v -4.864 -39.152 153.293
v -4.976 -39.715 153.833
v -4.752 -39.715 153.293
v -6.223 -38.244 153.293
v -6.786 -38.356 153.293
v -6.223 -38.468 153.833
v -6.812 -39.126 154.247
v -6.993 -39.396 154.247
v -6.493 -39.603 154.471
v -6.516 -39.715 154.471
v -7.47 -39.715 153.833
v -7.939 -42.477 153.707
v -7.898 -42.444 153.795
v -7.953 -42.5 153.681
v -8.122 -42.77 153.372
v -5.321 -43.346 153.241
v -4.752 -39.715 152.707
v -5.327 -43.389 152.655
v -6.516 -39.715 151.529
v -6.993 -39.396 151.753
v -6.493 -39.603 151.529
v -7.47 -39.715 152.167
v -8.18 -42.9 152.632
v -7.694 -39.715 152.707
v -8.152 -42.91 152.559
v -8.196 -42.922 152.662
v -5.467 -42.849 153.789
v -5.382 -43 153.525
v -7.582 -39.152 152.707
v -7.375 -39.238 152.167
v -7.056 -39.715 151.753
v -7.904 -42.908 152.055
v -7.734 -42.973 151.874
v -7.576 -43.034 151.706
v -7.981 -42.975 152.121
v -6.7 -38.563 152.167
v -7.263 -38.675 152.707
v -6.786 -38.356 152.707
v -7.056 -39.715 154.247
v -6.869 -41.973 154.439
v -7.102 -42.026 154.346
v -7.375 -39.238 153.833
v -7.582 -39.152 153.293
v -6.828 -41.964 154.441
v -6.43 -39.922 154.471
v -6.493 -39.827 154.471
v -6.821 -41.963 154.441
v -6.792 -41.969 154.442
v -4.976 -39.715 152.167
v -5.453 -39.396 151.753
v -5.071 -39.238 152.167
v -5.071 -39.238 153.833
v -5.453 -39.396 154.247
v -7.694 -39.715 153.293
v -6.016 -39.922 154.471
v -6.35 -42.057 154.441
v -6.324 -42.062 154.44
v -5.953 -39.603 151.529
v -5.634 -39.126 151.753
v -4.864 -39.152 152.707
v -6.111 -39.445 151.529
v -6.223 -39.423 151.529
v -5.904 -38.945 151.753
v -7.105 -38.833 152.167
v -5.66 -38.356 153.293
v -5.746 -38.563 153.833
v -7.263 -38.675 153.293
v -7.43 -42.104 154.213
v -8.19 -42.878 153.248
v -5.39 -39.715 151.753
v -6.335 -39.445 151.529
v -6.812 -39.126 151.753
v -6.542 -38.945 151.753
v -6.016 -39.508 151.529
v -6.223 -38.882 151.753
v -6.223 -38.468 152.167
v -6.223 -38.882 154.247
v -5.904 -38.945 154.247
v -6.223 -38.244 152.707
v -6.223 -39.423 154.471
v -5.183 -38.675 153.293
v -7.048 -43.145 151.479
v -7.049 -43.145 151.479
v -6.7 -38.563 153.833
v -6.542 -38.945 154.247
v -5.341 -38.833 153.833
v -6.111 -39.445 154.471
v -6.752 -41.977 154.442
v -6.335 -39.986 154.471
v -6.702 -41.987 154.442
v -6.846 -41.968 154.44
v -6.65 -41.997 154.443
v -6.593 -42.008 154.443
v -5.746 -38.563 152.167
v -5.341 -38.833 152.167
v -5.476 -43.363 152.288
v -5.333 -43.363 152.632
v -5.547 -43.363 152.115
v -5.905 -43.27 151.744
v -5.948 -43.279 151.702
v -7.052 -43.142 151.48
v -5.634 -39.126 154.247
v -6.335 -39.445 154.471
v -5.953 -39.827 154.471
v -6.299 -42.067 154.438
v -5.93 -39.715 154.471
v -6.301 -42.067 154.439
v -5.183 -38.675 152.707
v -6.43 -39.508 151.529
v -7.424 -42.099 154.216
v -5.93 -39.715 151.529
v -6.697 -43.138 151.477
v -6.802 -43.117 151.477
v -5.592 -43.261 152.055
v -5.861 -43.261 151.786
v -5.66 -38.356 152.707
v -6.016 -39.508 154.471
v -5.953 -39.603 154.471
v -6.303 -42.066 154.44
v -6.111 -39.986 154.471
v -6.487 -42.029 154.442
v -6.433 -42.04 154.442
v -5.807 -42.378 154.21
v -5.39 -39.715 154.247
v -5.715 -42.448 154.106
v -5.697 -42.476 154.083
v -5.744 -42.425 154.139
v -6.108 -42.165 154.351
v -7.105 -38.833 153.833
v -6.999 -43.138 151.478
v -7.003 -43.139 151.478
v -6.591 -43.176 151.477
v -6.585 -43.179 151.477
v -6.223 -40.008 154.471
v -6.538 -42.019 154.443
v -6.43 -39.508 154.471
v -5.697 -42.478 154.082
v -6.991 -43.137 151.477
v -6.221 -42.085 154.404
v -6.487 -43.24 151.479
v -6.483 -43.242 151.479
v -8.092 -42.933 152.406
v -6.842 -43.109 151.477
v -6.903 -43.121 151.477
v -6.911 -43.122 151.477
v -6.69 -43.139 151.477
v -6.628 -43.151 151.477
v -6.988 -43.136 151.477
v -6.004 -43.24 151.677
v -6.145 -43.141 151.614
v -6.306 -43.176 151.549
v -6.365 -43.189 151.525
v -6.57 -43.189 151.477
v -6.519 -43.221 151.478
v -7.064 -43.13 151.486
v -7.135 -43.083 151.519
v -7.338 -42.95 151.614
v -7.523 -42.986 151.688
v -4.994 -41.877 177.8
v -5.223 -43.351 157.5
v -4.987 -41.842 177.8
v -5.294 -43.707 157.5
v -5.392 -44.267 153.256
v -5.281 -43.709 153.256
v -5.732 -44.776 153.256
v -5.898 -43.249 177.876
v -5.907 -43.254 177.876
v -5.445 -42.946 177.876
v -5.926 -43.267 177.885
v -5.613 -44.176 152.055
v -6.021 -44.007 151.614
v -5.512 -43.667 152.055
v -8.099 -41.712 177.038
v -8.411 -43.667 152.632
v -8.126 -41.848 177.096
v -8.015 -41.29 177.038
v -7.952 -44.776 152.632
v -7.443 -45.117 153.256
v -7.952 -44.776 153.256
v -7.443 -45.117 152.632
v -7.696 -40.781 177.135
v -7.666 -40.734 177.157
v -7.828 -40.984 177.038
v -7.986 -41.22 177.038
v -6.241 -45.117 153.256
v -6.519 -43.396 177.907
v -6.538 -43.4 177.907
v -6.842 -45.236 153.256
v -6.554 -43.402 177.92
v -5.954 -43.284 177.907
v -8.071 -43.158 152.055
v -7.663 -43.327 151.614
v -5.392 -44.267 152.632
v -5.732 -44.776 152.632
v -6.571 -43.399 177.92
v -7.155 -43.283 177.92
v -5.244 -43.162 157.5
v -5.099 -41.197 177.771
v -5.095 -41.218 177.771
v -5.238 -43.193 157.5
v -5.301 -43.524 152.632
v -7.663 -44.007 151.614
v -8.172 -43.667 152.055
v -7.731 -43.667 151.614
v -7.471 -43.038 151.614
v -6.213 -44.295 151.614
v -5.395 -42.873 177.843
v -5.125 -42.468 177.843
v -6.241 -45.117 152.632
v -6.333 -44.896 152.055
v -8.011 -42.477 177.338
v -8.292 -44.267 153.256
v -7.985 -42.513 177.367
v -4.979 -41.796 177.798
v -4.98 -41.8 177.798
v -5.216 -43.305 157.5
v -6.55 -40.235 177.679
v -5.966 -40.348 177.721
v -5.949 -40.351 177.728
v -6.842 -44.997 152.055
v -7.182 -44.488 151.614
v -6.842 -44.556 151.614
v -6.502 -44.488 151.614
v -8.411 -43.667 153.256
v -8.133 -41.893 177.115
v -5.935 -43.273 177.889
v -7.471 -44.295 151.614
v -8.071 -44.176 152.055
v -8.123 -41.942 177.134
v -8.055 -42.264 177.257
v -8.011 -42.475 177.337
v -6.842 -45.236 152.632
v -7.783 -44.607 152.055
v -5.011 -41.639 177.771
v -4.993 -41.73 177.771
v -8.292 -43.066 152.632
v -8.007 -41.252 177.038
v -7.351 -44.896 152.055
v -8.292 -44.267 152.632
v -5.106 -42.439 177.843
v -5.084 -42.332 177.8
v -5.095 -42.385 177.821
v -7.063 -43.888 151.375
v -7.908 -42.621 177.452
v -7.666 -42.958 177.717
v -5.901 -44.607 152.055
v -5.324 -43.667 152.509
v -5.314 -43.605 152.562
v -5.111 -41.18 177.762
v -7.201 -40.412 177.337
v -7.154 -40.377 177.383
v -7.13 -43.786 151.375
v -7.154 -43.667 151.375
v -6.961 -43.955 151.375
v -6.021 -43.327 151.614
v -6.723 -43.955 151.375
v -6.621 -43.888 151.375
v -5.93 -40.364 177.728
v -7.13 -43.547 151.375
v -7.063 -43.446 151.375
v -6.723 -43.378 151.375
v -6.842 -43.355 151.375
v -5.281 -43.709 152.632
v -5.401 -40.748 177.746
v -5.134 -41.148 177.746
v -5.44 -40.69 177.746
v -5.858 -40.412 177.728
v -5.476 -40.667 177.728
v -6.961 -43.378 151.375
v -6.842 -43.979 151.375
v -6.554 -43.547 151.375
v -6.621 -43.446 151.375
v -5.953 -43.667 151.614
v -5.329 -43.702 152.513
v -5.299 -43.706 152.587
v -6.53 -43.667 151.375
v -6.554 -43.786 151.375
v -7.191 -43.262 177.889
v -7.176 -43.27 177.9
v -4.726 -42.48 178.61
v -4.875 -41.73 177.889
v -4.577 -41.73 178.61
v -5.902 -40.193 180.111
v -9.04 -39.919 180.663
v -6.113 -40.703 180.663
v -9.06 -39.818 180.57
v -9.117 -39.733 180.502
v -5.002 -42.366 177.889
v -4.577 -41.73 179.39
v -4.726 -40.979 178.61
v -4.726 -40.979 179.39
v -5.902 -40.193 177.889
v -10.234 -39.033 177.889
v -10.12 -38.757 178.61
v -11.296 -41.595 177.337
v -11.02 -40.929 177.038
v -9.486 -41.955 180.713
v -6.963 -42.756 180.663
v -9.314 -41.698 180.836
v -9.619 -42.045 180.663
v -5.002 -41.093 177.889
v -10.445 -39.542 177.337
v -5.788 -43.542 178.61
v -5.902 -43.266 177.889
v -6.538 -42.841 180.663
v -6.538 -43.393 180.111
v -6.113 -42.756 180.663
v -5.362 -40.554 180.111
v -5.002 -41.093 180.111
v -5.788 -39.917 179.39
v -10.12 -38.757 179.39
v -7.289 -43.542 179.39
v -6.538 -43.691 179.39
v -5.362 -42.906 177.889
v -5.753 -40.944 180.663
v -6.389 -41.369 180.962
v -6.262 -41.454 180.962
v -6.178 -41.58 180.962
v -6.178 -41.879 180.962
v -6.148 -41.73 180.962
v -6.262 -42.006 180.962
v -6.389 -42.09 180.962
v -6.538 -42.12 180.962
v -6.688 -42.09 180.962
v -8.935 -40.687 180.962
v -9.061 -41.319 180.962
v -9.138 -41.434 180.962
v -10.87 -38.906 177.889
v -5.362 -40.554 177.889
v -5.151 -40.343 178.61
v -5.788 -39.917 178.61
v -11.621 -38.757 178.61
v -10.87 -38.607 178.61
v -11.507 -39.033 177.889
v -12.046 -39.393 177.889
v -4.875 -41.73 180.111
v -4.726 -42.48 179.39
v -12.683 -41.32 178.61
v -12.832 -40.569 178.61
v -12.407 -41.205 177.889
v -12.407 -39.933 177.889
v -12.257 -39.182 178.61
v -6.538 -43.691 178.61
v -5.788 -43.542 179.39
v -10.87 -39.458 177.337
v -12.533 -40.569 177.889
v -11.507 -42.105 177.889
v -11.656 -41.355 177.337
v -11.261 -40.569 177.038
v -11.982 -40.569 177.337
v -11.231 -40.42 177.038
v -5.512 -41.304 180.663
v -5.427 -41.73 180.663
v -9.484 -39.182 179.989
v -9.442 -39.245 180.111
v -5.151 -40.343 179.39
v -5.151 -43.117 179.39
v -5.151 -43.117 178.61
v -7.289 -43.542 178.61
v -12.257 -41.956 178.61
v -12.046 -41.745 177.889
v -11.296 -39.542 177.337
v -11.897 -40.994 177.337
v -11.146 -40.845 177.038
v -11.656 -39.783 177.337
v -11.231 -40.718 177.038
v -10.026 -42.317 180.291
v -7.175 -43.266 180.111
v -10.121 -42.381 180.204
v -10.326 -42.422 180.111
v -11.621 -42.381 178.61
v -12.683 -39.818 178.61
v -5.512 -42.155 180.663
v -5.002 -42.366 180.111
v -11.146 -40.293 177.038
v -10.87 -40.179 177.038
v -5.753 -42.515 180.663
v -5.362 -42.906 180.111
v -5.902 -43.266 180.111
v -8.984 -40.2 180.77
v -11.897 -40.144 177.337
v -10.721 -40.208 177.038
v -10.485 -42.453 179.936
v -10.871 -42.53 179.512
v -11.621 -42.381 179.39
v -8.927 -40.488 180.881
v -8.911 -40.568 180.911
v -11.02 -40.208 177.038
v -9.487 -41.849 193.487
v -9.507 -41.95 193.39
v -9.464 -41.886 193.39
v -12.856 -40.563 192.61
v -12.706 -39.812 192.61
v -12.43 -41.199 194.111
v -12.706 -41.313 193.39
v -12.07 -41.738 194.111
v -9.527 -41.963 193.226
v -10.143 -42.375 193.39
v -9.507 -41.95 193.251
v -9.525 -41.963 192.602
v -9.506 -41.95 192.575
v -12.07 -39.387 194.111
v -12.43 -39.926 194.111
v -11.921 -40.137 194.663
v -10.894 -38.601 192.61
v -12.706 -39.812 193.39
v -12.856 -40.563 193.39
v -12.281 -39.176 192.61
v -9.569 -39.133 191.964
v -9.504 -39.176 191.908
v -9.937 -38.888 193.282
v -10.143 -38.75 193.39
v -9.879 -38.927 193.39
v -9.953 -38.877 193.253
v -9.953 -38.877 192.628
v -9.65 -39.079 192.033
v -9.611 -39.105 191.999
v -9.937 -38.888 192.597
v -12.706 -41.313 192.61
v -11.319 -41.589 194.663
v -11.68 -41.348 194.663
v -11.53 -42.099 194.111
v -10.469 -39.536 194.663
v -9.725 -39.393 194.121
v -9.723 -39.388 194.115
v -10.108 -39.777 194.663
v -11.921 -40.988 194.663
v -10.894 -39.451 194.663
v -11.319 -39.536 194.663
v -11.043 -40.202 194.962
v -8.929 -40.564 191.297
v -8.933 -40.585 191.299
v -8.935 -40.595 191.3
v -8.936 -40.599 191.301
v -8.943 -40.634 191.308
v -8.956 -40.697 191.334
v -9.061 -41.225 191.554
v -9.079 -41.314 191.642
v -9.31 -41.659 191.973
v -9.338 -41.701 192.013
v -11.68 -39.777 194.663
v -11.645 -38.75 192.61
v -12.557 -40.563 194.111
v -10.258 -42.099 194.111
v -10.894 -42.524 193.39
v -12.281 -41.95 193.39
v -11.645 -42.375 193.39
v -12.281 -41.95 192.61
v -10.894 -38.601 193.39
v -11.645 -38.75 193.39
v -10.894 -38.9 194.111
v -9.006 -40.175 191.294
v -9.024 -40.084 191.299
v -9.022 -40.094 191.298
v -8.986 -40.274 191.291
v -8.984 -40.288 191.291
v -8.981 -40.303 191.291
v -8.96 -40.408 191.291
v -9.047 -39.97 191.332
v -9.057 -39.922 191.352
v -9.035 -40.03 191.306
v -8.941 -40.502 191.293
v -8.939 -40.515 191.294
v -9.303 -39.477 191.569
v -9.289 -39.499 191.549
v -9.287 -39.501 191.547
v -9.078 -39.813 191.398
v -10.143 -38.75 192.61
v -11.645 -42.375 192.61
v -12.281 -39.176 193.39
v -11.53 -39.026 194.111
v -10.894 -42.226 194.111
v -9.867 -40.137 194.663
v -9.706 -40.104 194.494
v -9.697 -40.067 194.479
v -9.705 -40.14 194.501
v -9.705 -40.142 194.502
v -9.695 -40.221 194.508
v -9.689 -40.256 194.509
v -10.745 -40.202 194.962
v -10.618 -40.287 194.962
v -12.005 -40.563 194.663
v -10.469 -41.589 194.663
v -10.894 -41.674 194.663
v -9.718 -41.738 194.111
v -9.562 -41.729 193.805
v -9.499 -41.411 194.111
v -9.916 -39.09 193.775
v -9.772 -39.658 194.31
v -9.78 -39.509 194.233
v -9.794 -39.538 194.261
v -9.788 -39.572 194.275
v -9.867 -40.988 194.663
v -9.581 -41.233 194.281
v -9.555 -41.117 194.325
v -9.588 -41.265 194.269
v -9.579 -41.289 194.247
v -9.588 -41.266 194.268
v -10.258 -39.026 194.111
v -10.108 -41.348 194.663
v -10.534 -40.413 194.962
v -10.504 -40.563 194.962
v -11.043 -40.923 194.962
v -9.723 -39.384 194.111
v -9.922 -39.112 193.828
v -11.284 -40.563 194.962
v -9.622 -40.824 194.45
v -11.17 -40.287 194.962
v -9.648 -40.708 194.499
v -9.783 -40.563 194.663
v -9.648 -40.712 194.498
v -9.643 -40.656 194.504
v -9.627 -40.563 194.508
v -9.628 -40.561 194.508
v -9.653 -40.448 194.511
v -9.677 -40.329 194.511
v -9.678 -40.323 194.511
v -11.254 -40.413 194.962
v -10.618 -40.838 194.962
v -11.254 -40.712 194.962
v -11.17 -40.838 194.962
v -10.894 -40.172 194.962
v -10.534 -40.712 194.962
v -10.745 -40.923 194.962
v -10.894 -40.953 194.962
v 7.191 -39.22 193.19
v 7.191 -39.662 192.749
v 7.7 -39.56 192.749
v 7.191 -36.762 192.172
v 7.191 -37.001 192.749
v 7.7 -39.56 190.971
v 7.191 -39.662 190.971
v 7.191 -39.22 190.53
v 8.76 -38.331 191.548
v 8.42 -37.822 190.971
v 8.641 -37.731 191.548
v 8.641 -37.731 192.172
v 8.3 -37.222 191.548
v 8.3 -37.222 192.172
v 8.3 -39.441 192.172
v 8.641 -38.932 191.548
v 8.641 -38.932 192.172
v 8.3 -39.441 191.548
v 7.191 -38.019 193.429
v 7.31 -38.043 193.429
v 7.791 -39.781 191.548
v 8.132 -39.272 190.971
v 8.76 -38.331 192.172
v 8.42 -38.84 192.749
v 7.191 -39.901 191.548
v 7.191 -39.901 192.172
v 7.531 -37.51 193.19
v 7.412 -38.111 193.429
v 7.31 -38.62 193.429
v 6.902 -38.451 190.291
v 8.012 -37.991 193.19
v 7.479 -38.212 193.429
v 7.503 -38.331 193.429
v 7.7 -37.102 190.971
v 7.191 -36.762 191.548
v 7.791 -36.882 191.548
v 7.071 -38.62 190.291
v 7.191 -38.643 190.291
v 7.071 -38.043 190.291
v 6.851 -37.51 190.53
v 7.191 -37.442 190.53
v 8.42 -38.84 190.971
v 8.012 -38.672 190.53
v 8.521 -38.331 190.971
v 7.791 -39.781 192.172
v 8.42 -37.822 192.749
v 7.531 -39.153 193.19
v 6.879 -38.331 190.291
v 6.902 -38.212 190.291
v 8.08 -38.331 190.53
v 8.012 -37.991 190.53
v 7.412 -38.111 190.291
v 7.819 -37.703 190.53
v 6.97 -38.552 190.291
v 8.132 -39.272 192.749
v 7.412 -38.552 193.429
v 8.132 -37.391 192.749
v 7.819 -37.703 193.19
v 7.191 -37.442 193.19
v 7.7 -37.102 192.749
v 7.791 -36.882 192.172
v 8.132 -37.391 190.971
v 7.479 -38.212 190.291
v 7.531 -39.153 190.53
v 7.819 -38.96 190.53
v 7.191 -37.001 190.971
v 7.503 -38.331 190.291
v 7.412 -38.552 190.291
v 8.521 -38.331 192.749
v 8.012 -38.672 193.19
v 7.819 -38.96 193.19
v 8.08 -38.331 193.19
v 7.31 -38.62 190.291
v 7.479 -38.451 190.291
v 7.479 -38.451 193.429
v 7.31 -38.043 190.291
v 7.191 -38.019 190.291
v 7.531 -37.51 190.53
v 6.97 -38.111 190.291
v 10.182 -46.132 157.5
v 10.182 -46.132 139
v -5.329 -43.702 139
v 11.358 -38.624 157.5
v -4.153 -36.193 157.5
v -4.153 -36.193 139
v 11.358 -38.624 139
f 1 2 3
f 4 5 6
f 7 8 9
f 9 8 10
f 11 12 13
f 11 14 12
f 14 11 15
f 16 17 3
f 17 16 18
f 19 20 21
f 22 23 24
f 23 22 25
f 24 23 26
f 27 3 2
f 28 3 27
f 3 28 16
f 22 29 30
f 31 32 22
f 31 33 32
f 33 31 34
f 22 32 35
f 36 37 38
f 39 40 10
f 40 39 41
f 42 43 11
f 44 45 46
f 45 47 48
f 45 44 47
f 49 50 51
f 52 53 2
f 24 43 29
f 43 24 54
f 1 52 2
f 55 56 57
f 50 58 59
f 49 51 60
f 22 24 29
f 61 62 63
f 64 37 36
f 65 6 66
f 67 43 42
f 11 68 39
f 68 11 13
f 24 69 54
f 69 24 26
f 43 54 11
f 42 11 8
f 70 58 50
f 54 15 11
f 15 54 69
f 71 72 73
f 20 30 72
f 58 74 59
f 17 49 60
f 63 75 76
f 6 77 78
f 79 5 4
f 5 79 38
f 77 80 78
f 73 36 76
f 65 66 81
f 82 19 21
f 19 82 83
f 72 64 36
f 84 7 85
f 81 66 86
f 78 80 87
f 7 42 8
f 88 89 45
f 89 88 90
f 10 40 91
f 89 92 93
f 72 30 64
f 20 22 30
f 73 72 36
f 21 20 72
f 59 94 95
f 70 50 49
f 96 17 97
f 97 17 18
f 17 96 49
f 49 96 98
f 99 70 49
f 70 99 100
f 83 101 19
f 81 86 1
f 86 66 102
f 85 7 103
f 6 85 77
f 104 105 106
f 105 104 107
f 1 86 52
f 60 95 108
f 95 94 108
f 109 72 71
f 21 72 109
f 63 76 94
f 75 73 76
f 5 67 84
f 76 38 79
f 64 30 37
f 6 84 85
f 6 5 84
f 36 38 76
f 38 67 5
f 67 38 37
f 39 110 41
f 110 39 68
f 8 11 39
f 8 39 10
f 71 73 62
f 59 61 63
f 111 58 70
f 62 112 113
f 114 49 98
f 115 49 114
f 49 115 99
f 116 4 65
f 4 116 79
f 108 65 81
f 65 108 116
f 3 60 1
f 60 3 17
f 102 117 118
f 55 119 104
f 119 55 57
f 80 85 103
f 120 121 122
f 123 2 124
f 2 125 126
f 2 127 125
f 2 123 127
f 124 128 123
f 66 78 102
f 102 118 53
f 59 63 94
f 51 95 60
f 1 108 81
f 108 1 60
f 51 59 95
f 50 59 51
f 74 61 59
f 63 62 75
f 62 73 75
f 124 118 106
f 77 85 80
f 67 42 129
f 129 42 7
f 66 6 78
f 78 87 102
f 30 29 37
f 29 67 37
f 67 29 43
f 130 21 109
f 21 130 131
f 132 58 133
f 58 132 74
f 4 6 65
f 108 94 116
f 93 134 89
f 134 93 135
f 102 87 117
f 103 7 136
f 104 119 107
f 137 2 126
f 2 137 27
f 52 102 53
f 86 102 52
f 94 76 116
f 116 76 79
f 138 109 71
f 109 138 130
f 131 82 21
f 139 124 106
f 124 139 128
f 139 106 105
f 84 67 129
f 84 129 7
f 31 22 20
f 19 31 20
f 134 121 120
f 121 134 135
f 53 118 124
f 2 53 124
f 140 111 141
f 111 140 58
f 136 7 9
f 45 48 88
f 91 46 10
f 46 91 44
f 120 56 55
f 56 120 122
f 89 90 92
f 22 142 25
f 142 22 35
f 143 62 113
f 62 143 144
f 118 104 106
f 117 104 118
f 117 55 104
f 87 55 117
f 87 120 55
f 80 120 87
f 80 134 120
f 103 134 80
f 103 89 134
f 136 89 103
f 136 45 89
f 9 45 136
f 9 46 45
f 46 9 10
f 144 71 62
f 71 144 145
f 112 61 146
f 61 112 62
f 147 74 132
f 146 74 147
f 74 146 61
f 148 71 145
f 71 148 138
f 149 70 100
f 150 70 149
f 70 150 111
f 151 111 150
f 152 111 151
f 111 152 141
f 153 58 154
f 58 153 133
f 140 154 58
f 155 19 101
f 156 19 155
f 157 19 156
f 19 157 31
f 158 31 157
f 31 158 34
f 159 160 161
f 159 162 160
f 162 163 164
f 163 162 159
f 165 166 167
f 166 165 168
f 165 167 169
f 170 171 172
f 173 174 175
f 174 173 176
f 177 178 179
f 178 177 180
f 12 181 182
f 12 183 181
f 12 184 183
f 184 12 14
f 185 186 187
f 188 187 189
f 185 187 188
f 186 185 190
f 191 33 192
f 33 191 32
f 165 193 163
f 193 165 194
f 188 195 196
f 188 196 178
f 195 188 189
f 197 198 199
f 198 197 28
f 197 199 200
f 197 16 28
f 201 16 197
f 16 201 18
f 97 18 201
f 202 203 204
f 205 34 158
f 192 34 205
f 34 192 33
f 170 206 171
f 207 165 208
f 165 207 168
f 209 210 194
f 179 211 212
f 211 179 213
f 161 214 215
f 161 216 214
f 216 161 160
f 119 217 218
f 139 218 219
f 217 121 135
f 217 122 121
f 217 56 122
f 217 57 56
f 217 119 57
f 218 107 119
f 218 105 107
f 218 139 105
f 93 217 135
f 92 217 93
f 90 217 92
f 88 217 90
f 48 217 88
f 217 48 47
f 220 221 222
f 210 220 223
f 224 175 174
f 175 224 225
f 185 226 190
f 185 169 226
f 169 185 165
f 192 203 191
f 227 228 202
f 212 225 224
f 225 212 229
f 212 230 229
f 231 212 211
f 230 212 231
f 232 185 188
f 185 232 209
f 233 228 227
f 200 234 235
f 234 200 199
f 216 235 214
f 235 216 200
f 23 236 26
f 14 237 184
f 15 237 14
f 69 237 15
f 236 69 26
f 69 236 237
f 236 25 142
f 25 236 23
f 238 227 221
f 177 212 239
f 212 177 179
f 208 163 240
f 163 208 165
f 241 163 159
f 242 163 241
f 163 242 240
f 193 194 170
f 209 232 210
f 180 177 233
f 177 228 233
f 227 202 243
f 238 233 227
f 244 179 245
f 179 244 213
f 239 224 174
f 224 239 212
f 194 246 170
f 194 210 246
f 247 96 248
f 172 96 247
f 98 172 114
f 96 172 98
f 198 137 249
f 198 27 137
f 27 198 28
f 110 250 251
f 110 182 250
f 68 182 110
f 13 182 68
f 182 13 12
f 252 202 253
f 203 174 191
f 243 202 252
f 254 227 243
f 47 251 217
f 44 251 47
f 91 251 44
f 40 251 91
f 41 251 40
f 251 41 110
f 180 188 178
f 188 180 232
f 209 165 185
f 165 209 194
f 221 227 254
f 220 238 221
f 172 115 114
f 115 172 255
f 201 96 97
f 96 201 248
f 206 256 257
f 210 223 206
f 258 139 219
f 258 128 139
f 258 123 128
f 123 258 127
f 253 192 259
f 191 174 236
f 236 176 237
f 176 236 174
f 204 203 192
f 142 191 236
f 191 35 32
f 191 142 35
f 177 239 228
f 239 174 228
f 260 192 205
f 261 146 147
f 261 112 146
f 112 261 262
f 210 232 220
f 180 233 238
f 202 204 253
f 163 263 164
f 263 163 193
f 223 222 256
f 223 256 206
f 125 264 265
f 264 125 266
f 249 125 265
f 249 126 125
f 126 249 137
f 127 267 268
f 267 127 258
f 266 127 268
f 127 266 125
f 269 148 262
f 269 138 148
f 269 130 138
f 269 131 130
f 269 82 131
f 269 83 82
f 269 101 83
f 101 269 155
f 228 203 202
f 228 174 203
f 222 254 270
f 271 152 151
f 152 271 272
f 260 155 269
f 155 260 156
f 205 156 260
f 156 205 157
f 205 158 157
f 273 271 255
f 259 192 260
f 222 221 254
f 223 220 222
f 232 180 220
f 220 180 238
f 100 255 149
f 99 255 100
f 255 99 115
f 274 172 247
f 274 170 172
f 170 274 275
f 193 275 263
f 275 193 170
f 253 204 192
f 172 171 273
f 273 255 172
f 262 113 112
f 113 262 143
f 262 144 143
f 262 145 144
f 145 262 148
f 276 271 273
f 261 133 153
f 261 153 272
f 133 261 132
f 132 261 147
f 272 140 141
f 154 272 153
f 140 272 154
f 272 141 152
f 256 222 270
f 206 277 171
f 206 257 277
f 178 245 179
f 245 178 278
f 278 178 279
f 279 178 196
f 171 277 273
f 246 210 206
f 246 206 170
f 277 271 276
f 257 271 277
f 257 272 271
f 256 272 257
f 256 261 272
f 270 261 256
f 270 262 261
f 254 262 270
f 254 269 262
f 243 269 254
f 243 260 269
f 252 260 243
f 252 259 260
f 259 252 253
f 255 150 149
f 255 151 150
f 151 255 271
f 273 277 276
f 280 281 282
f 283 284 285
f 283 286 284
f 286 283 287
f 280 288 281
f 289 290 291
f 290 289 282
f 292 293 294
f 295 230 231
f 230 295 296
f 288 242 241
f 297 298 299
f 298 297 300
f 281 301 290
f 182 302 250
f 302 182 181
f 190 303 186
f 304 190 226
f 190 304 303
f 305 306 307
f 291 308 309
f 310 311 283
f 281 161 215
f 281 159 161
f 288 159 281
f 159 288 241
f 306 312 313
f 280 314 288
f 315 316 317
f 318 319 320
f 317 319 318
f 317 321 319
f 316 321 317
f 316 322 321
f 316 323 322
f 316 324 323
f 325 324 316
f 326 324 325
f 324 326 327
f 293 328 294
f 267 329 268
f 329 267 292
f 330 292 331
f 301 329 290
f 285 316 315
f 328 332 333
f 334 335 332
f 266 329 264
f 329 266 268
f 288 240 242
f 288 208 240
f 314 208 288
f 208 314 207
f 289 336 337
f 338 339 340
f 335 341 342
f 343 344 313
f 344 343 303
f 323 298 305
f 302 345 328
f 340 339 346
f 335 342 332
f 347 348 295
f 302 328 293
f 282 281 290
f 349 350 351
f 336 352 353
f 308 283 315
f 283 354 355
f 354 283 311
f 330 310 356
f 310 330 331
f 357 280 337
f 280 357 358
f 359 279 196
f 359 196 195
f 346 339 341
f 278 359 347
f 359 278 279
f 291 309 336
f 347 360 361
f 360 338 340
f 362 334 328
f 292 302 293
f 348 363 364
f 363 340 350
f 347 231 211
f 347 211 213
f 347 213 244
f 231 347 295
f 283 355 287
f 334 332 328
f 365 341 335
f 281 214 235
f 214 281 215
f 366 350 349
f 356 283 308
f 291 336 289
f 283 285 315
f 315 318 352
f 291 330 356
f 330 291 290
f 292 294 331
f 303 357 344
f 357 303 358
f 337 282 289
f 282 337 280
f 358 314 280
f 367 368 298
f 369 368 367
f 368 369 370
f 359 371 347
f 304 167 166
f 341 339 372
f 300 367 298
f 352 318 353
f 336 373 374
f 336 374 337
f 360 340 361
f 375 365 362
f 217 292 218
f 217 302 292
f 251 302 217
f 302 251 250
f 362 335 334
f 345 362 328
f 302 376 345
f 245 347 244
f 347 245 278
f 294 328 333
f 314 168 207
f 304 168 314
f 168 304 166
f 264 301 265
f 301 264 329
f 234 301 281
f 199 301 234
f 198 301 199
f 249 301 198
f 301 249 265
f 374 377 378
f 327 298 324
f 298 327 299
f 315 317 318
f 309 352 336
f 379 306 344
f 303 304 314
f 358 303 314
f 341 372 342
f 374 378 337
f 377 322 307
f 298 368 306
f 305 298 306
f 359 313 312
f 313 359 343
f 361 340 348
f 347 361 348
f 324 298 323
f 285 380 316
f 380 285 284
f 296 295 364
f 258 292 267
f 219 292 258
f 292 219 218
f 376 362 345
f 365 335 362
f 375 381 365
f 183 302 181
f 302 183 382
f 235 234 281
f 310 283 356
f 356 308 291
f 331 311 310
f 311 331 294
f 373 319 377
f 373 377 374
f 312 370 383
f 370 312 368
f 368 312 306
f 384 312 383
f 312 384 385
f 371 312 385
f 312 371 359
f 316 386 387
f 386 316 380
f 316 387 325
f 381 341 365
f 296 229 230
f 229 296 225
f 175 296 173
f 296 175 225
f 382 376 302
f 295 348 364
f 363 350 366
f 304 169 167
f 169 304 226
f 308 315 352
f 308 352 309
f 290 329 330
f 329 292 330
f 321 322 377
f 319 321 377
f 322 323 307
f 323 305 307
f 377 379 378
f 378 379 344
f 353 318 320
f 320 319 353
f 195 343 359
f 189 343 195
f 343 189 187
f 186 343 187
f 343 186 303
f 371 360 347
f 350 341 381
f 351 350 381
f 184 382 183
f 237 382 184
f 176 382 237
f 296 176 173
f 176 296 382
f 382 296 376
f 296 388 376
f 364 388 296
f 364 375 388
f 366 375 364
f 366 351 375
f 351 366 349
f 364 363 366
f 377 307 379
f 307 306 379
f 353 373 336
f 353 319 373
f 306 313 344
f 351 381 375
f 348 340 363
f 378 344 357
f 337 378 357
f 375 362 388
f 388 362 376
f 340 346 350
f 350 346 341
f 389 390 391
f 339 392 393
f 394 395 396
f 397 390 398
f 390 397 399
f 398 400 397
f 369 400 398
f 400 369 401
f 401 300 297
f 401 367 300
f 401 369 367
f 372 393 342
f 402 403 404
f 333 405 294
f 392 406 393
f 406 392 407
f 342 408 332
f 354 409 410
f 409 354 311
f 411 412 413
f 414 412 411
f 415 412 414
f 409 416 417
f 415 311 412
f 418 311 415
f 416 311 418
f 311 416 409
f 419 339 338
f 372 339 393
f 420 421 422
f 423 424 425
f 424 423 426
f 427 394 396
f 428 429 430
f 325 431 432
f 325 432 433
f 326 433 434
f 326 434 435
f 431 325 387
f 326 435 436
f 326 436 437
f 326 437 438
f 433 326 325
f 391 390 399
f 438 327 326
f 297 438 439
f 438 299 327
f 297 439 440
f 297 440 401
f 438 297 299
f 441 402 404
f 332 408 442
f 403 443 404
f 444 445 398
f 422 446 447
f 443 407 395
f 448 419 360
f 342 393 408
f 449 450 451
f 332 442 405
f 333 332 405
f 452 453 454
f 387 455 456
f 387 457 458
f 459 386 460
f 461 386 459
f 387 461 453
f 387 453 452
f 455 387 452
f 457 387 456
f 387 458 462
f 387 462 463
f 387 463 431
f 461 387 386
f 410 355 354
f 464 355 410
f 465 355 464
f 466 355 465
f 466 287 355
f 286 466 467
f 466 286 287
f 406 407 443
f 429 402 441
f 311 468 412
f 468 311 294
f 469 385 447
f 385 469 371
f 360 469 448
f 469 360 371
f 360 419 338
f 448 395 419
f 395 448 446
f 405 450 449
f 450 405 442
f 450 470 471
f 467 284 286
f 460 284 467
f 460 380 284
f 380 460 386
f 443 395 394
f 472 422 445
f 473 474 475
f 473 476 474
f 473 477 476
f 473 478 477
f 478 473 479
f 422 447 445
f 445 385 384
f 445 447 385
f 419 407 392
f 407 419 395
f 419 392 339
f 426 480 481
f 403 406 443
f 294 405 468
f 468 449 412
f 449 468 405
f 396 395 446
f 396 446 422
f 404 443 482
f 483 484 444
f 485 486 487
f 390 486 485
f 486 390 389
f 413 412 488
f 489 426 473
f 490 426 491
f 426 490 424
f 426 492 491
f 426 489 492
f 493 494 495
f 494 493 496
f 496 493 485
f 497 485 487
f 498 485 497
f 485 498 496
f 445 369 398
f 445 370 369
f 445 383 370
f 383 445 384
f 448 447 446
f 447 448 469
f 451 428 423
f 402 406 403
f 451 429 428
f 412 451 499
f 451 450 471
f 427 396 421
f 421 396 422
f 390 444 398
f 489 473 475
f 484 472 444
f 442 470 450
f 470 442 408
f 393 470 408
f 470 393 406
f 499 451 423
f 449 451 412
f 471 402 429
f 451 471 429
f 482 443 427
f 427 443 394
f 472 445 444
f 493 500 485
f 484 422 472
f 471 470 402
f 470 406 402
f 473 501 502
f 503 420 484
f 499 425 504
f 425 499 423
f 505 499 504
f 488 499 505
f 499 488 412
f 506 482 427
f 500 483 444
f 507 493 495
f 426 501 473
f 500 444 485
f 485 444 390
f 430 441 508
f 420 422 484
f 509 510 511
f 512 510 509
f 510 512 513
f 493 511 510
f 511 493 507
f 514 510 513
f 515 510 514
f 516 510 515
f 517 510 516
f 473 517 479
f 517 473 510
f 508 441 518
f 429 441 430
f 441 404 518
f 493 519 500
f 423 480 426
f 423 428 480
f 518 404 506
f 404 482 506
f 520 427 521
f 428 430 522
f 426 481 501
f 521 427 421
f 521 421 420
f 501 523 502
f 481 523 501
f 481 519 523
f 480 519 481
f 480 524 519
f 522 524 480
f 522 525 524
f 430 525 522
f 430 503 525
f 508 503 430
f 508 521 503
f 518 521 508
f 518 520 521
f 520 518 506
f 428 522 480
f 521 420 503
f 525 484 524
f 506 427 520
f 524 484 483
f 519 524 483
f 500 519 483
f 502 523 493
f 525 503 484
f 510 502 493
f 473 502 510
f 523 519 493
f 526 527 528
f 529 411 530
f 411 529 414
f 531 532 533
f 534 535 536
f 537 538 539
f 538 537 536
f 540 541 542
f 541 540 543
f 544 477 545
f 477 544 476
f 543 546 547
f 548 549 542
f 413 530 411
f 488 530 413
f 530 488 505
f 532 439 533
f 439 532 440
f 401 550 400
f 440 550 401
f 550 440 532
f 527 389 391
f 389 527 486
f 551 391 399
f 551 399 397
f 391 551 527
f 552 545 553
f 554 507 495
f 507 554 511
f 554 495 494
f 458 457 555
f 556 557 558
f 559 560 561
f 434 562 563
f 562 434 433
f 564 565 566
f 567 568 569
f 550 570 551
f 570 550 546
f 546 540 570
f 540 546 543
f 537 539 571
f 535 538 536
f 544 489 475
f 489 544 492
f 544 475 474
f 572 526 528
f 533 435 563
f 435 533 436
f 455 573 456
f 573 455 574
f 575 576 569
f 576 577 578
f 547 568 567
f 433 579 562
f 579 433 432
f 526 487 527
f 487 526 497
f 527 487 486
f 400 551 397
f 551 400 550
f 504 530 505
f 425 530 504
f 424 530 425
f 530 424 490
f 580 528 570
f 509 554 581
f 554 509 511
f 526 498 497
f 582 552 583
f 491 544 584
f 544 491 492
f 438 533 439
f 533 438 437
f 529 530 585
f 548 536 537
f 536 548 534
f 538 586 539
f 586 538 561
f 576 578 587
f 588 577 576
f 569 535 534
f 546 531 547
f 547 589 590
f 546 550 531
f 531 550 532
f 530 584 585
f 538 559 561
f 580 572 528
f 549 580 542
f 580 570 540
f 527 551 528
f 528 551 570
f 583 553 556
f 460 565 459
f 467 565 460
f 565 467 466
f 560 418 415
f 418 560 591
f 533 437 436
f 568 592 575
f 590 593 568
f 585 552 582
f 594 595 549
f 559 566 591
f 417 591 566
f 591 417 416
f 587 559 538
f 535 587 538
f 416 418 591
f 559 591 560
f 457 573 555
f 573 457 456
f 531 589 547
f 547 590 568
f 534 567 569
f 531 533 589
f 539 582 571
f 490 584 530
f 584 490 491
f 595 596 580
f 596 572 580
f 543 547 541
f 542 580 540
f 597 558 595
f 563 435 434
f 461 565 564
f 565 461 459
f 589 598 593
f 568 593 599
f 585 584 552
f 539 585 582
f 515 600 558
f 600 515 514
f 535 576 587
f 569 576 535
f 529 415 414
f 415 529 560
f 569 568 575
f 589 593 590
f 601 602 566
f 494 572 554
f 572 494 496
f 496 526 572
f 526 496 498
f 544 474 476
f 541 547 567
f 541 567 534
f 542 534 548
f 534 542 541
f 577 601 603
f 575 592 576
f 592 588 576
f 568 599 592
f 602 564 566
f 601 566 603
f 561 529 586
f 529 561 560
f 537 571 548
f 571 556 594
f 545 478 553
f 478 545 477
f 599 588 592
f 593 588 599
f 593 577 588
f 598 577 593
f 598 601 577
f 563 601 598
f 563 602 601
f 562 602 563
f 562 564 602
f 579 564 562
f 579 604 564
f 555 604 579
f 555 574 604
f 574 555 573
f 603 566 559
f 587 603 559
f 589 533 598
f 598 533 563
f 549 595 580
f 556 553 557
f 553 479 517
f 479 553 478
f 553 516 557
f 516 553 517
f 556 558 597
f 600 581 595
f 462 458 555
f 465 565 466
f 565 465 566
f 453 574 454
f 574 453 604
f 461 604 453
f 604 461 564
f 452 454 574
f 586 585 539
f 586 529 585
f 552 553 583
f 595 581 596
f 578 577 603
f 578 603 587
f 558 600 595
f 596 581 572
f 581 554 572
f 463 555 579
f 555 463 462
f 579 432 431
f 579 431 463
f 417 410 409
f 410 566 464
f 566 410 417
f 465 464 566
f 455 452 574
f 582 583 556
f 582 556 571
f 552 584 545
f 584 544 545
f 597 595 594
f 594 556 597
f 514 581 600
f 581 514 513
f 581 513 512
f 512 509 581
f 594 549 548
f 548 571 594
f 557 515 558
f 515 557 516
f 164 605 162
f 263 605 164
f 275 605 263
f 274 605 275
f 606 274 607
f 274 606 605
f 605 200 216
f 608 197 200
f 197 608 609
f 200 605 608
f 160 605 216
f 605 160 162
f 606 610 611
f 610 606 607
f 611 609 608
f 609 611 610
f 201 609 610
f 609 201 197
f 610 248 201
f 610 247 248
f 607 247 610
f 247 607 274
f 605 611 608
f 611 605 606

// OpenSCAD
// file: nozzle_servo_linkage_64_params.scad
// GENERATED by tools/nozzle_servo_linkage_64.py — do not hand-edit.
// 64 mm nozzle servo linkage, STARBOARD nacelle-local frame (port = mirror x).
NSL_B_R = 39.0; NSL_B_Z = 191.860;
NSL_PSI_CLOSED = 292.5; NSL_PSI_OPEN = 268.75;
NSL_C = [-10.8704, -40.5689, 179.0000];  NSL_C_AZ = 255.0; NSL_C_R = 42.0;
NSL_U = [-0.965926, 0.258819, 0.000000];  NSL_V = [-0.000000, 0.000000, -1.000000];
NSL_L_OUT = 14.0; NSL_L_IN = 4.485; NSL_L_ROD = 18.686; NSL_LINK = 26.073865334942944;
NSL_PHI_CLOSED = 231.000; NSL_PHI_OPEN = 309.200;
NSL_ARM_OFFSET = -90.100;   // input arm angle - output arm angle
NSL_SHAFT = [-6.2229, -39.7154, 153.0000];  NSL_SHAFT_AZ = -98.905;
NSL_HORN = 4.0; NSL_SERVO_SWEEP = 90.10; NSL_TH_CLOSED = -45.85; NSL_TH_OPEN = 44.25;
NSL_SERVO = [18.5, 7.6, 15.7];   // BMS-101DMG L x W x H [REF-ACT-004] VERIFY
// main file
// =============================================================================
// nacelle_nozzle_servo_64mm.scad — 64 mm nozzle servo drive in the dorsal spine
// =============================================================================
// WBS NAC-64-SERVO-01.  Owner decisions 2026-10-04: servo inside the canonical
// dorsal spine; the spine blended aft over the nozzle housing (QMx side view,
// REF-CAD-003); a bellcrank so the drive stays inside canon; the spine
// extension FIXED on the pod so the nozzle is a field-swap module (forward-open
// notch, 2 captive screws, no linkage part handled).
//
// All kinematics come from nozzle_servo_linkage_64_params.scad, GENERATED by
// tools/nozzle_servo_linkage_64.py (never hand-edit): servo BMS-101DMG
// [REF-ACT-004] flat in the spine, shaft tangential, 4 mm horn, +/-45 deg ->
// link -> bellcrank on a radial Ø2 pin (input 4.5 / output 14 mm) -> 18.7 mm
// rod -> the ring's open ball cup at r 39.  Starboard frame; port = mirror x.
//
// Used by nacelle_pod_64mm_tandem.scad:
//   nsv_pod_cuts()  — Zone B: servo pocket, horn/link/bellcrank/rod sweeps,
//                     cover opening + ledge, pin bore, cover-screw inserts
//   nsv_pod_adds()  — Zone C: spine extension over the housing (with the two
//                     captive nozzle-screw counterbores)
// Own parts (NSV_PART): "cover" (print), "bellcrank" (print), "asm" (preview).
//
// COTS: M2 threaded rod + 2 x M2 ball links (rod and link), Ø2 x 12 steel
// dowel (pivot), 3 x M2 captive screws + inserts (cover), 2 x M3 captive
// screws (nozzle).  FORCE MARGIN IS THIN: ear holding 2.6 N vs spring 2.0 N
// (tool output) — if the U8 flap load exceeds ~0.6 N, fit a higher-torque
// servo in the same pocket (WBS NAC-64-SERVO-01).
//
// Author: Claude (Claude Opus 5.5, Anthropic) under the direction of
// Stab-Rabbit-coding, per AGENTS.md AI attribution.  License: CC BY 4.0.
// =============================================================================

include <nozzle_servo_linkage_64_params.scad>

NSV_PART  = "asm";
NSV_SIDE  = 1;              // +1 stbd, -1 port (mirror)
NSV_SHELL = "../../stls/nacelles/eng_right_shell24_50mm_repaired.stl";
NSV_CLR   = 0.6;            // [mm] pocket running clearance
NSV_COVER_T = 1.6;          // [mm] cover skin thickness (>= 1.5)
NSV_SPINE_Z = [138.0, 187.0];   // cover / opening axial span
NSV_SPINE_AZ = [250.0, 292.0];  // cover / opening azimuth span (stbd)
NSV_FLOOR_R = 36.4;         // bore wall (34.7) + 1.7

function nsv_er(az) = [cos(az), sin(az), 0];
function nsv_et(az) = [-sin(az), cos(az), 0];
function nsv_arm(phi, L) = NSL_C + L * (cos(phi) * NSL_U + sin(phi) * NSL_V);
function nsv_ball(psi) = [NSL_B_R * cos(psi), NSL_B_R * sin(psi), NSL_B_Z];
function nsv_horn(th) = NSL_SHAFT + NSL_HORN * (cos(th) * nsv_er(NSL_SHAFT_AZ) + sin(th) * [0, 0, 1]);
// Bellcrank angle phi interpolated linearly in psi (the solved map is near-
// linear over this 24 deg stroke; the tool owns the exact one).
function nsv_phi(f) = NSL_PHI_CLOSED + f * (NSL_PHI_OPEN - NSL_PHI_CLOSED);
function nsv_th(f)  = NSL_TH_CLOSED  + f * (NSL_TH_OPEN  - NSL_TH_CLOSED);
function nsv_psi(f) = NSL_PSI_CLOSED + f * (NSL_PSI_OPEN - NSL_PSI_CLOSED);

module nsv_seg(p, q, d) { hull() { translate(p) sphere(d = d, $fn = 16); translate(q) sphere(d = d, $fn = 16); } }

// Servo body: L along z, W radial (centred on the shaft radius), H tangential
// on the +az side of the horn plane.  Shaft 4.5 mm from the body's aft end.
module nsv_servo_body(clr = 0) {
    s = NSL_SERVO;
    rotate([0, 0, NSL_SHAFT_AZ])
        translate([norm([NSL_SHAFT[0], NSL_SHAFT[1]]) - s[1] / 2 - clr, 1.5 - clr,
                   NSL_SHAFT[2] - (s[0] - 4.5) - clr])
            cube([s[1] + 2 * clr, s[2] + 2 * clr, s[0] + 2 * clr]);
}

// Everything that moves, swept over the stroke (for cuts) or at fraction f.
module nsv_moving(f, d_add = 0) {
    th = nsv_th(f); ph = nsv_phi(f); ps = nsv_psi(f);
    nsv_seg(NSL_SHAFT, nsv_horn(th), 3.0 + d_add);                        // horn
    nsv_seg(nsv_horn(th), nsv_arm(ph + NSL_ARM_OFFSET, NSL_L_IN), 3.2 + d_add); // link + ball links
    nsv_seg(nsv_arm(ph + NSL_ARM_OFFSET, NSL_L_IN), NSL_C, 4.0 + d_add);  // bellcrank in-arm
    nsv_seg(NSL_C, nsv_arm(ph, NSL_L_OUT), 4.0 + d_add);                  // bellcrank out-arm
    nsv_seg(nsv_arm(ph, NSL_L_OUT), nsv_ball(ps), 3.2 + d_add);           // rod + ball link
}
// Aft part of the mechanism only (bellcrank output arm + rod): the part that
// leaves the canonical spine; it alone shapes the fairing.
module nsv_moving_aft(f, d_add = 0) {
    ph = nsv_phi(f); ps = nsv_psi(f);
    nsv_seg(NSL_C, nsv_arm(ph, NSL_L_OUT), 4.0 + d_add);
    nsv_seg(nsv_arm(ph, NSL_L_OUT), nsv_ball(ps), 3.2 + d_add);
}
module nsv_sweep_aft(d_add) { for (k = [0 : 6]) hull() { nsv_moving_aft(k / 7, d_add); nsv_moving_aft((k + 1) / 7, d_add); } }
module nsv_sweep(d_add) { for (k = [0 : 6]) hull() { nsv_moving(k / 7, d_add); nsv_moving((k + 1) / 7, d_add); } }

module nsv_shell() { scale([1.21, 1.21, 1.13]) translate([-155.02, 190.79, 0]) import(NSV_SHELL, convexity = 6); }
module nsv_wedge(a0, a1, z0, z1, r1 = 80) {
    translate([0, 0, z0]) linear_extrude(z1 - z0)
        polygon(concat([[0, 0]], [for (a = [a0 : 2 : a1]) r1 * [cos(a), sin(a)]], [r1 * [cos(a1), sin(a1)]]));
}
// Material that stays: everything deeper than (skin - cover) — approximated by
// the shell shrunk radially by the cover thickness about the duct axis.
module offset_skin_inner() {
    k = 1 - NSV_COVER_T / 46.0;
    scale([k, k, 1]) nsv_shell();
}
NSV_COVER_SCREWS = [[252.5, 141.0], [289.5, 141.0], [287.0, 184.0]];   // [az, z] on solid ledge
module nsv_cover_screw_axes(d, h0, h1) {
    for (s = NSV_COVER_SCREWS) rotate([0, 0, s[0]]) translate([h0, 0, s[1]])
        rotate([0, 90, 0]) cylinder(d = d, h = h1 - h0, $fn = 16);
}

module nsv_pod_cuts() {
    mirror([NSV_SIDE < 0 ? 1 : 0, 0, 0]) {
        nsv_servo_body(NSV_CLR);
        nsv_sweep(2 * NSV_CLR);
        // service wells: open the servo pocket and the bellcrank area up to
        // the cover so both lift out through the cover opening alone
        hull() { nsv_servo_body(NSV_CLR);
                 rotate([0, 0, NSL_SHAFT_AZ]) translate([0, 0, 0]) scale([1, 1, 1])
                     translate([norm([NSL_SHAFT[0], NSL_SHAFT[1]]) + 8, 1.5 - NSV_CLR,
                                NSL_SHAFT[2] - (NSL_SERVO[0] - 4.5) - NSV_CLR])
                         cube([4, NSL_SERVO[2] + 2 * NSV_CLR, NSL_SERVO[0] + 2 * NSV_CLR]); }
        translate(NSL_C) rotate([0, 0, NSL_C_AZ]) rotate([0, 90, 0])
            translate([0, 0, -1.5]) cylinder(r = NSL_L_OUT + 2.5, h = 12, $fn = 48);
        // pivot pin bore (radial), Ø2 press into the floor boss
        translate(NSL_C) rotate([0, 0, NSL_C_AZ]) translate([-6.0, 0, 0])
            rotate([0, 90, 0]) cylinder(d = 2.0, h = 6.0, $fn = 16);
        // cover opening: skin outside (skin - cover) over the spine wedge
        intersection() { nsv_wedge(NSV_SPINE_AZ[0], NSV_SPINE_AZ[1], NSV_SPINE_Z[0], NSV_SPINE_Z[1]);
                         difference() { cylinder(r = 80, h = 400); offset_skin_inner(); } }
        // M2 x 3 heat-set inserts for the captive cover screws (into the ledge)
        nsv_cover_screw_axes(3.2, 38.6, 44.0);
    }
}

// Spine extension: the canonical spine's last section (Z 182..187.86) blended
// aft onto the housing by Z 203, kept clear of the housing (r 42.9) and of
// the rod sweep; counterbores for the 2 captive M3 nozzle screws.
module nsv_pod_adds() {
    mirror([NSV_SIDE < 0 ? 1 : 0, 0, 0]) difference() {
        // Fairing = hull(canonical spine's last section, the aft mechanism's
        // sweep + running clearance + a 1.6 mm skin, an end strake on the
        // housing): wherever the drive leaves canon it is covered by a
        // printable wall and no more (blend per the QMx side view).
        hull() {
            intersection() { nsv_shell(); nsv_wedge(242, 324, 182.0, 187.86); }
            nsv_sweep_aft(2 * NSV_CLR + 2 * NSV_COVER_T);
            rotate([0, 0, 280]) translate([42.9, -21, 202.5]) cube([2.0, 42, 0.5]);
        }
        translate([0, 0, 187.86]) cylinder(r = 42.9, h = 30, $fn = 180);
        translate([0, 0, 170]) cylinder(r = 34.8, h = 60, $fn = 180);   // sleeve bore / spigot
        nsv_sweep(2 * NSV_CLR);
        // clearance for the nozzle's retention bosses (nacelle_nozzle_iris_64mm
        // NZ64_BOSS_*: az 302 / 316, r to 45.6, z 1..9, 7 mm wide) + 0.3,
        // open aft so the nozzle slides off
        for (a = [302, 316]) rotate([0, 0, a])
            translate([42.0, -3.8, 187.86 + 0.7]) cube([4.0, 7.6, 30]);
        for (a = [302, 316]) rotate([0, 0, a]) translate([42.0, 0, 187.86 + 5.0])
            rotate([0, 90, 0]) { cylinder(d = 3.4, h = 8, $fn = 16);
                                 translate([0, 0, 3.6]) cylinder(d = 5.8, h = 6, $fn = 20); }
    }
}

// Access cover = the skin removed by the opening, minus the moving sweep,
// with captive-screw clearance holes.
module nsv_cover() {
    mirror([NSV_SIDE < 0 ? 1 : 0, 0, 0]) difference() {
        intersection() { nsv_shell();
                         nsv_wedge(NSV_SPINE_AZ[0] + 0.3, NSV_SPINE_AZ[1] - 0.3,
                                   NSV_SPINE_Z[0] + 0.3, NSV_SPINE_Z[1] - 0.3);
                         difference() { cylinder(r = 80, h = 400); offset_skin_inner(); } }
        nsv_sweep(2 * NSV_CLR);
        nsv_cover_screw_axes(2.4, 38.0, 60.0);
    }
}

// Rod clearance in the RING frame (used by the 64 mm nozzle's ring): the rod
// body (not its last 1.8 mm = the ball) at each stroke point, rotated into the
// ring's own frame (ring turns by psi - closed) and shifted to ring z.
module nsv_rod_clearance_ring_frame(d = 4.0, z_noz = 187.86) {
    for (k = [0 : 7]) let(f = k / 7, ps = nsv_psi(f), tip = nsv_arm(nsv_phi(f), NSL_L_OUT),
                          b = nsv_ball(ps), u = (b - tip) / norm(b - tip))
        rotate([0, 0, -(ps - NSL_PSI_CLOSED)]) translate([0, 0, -z_noz])
            nsv_seg(tip, b - 1.8 * u, d);
}

// Printed bellcrank (CF-PETG), in its own frame: pivot at the origin, axis z.
module nsv_bellcrank() {
    difference() {
        hull() {
            cylinder(d = 5.0, h = 3.0, $fn = 32);
            rotate([0, 0, NSL_ARM_OFFSET]) translate([NSL_L_IN, 0, 0]) cylinder(d = 4.2, h = 3.0, $fn = 24);
            translate([NSL_L_OUT, 0, 0]) cylinder(d = 4.2, h = 3.0, $fn = 24);
        }
        translate([0, 0, -1]) cylinder(d = 2.1, h = 5, $fn = 16);                       // pin
        rotate([0, 0, NSL_ARM_OFFSET]) translate([NSL_L_IN, 0, -1]) cylinder(d = 1.8, h = 5, $fn = 12); // M2 tap
        translate([NSL_L_OUT, 0, -1]) cylinder(d = 1.8, h = 5, $fn = 12);               // M2 tap
    }
}

if (is_undef(NSV_NO_RENDER)) {
    if (NSV_PART == "cover") nsv_cover();
    else if (NSV_PART == "bellcrank") nsv_bellcrank();
    else mirror([NSV_SIDE < 0 ? 1 : 0, 0, 0]) {
        color("Red") nsv_servo_body();
        color("Black") nsv_moving(0.5);
    }
}
